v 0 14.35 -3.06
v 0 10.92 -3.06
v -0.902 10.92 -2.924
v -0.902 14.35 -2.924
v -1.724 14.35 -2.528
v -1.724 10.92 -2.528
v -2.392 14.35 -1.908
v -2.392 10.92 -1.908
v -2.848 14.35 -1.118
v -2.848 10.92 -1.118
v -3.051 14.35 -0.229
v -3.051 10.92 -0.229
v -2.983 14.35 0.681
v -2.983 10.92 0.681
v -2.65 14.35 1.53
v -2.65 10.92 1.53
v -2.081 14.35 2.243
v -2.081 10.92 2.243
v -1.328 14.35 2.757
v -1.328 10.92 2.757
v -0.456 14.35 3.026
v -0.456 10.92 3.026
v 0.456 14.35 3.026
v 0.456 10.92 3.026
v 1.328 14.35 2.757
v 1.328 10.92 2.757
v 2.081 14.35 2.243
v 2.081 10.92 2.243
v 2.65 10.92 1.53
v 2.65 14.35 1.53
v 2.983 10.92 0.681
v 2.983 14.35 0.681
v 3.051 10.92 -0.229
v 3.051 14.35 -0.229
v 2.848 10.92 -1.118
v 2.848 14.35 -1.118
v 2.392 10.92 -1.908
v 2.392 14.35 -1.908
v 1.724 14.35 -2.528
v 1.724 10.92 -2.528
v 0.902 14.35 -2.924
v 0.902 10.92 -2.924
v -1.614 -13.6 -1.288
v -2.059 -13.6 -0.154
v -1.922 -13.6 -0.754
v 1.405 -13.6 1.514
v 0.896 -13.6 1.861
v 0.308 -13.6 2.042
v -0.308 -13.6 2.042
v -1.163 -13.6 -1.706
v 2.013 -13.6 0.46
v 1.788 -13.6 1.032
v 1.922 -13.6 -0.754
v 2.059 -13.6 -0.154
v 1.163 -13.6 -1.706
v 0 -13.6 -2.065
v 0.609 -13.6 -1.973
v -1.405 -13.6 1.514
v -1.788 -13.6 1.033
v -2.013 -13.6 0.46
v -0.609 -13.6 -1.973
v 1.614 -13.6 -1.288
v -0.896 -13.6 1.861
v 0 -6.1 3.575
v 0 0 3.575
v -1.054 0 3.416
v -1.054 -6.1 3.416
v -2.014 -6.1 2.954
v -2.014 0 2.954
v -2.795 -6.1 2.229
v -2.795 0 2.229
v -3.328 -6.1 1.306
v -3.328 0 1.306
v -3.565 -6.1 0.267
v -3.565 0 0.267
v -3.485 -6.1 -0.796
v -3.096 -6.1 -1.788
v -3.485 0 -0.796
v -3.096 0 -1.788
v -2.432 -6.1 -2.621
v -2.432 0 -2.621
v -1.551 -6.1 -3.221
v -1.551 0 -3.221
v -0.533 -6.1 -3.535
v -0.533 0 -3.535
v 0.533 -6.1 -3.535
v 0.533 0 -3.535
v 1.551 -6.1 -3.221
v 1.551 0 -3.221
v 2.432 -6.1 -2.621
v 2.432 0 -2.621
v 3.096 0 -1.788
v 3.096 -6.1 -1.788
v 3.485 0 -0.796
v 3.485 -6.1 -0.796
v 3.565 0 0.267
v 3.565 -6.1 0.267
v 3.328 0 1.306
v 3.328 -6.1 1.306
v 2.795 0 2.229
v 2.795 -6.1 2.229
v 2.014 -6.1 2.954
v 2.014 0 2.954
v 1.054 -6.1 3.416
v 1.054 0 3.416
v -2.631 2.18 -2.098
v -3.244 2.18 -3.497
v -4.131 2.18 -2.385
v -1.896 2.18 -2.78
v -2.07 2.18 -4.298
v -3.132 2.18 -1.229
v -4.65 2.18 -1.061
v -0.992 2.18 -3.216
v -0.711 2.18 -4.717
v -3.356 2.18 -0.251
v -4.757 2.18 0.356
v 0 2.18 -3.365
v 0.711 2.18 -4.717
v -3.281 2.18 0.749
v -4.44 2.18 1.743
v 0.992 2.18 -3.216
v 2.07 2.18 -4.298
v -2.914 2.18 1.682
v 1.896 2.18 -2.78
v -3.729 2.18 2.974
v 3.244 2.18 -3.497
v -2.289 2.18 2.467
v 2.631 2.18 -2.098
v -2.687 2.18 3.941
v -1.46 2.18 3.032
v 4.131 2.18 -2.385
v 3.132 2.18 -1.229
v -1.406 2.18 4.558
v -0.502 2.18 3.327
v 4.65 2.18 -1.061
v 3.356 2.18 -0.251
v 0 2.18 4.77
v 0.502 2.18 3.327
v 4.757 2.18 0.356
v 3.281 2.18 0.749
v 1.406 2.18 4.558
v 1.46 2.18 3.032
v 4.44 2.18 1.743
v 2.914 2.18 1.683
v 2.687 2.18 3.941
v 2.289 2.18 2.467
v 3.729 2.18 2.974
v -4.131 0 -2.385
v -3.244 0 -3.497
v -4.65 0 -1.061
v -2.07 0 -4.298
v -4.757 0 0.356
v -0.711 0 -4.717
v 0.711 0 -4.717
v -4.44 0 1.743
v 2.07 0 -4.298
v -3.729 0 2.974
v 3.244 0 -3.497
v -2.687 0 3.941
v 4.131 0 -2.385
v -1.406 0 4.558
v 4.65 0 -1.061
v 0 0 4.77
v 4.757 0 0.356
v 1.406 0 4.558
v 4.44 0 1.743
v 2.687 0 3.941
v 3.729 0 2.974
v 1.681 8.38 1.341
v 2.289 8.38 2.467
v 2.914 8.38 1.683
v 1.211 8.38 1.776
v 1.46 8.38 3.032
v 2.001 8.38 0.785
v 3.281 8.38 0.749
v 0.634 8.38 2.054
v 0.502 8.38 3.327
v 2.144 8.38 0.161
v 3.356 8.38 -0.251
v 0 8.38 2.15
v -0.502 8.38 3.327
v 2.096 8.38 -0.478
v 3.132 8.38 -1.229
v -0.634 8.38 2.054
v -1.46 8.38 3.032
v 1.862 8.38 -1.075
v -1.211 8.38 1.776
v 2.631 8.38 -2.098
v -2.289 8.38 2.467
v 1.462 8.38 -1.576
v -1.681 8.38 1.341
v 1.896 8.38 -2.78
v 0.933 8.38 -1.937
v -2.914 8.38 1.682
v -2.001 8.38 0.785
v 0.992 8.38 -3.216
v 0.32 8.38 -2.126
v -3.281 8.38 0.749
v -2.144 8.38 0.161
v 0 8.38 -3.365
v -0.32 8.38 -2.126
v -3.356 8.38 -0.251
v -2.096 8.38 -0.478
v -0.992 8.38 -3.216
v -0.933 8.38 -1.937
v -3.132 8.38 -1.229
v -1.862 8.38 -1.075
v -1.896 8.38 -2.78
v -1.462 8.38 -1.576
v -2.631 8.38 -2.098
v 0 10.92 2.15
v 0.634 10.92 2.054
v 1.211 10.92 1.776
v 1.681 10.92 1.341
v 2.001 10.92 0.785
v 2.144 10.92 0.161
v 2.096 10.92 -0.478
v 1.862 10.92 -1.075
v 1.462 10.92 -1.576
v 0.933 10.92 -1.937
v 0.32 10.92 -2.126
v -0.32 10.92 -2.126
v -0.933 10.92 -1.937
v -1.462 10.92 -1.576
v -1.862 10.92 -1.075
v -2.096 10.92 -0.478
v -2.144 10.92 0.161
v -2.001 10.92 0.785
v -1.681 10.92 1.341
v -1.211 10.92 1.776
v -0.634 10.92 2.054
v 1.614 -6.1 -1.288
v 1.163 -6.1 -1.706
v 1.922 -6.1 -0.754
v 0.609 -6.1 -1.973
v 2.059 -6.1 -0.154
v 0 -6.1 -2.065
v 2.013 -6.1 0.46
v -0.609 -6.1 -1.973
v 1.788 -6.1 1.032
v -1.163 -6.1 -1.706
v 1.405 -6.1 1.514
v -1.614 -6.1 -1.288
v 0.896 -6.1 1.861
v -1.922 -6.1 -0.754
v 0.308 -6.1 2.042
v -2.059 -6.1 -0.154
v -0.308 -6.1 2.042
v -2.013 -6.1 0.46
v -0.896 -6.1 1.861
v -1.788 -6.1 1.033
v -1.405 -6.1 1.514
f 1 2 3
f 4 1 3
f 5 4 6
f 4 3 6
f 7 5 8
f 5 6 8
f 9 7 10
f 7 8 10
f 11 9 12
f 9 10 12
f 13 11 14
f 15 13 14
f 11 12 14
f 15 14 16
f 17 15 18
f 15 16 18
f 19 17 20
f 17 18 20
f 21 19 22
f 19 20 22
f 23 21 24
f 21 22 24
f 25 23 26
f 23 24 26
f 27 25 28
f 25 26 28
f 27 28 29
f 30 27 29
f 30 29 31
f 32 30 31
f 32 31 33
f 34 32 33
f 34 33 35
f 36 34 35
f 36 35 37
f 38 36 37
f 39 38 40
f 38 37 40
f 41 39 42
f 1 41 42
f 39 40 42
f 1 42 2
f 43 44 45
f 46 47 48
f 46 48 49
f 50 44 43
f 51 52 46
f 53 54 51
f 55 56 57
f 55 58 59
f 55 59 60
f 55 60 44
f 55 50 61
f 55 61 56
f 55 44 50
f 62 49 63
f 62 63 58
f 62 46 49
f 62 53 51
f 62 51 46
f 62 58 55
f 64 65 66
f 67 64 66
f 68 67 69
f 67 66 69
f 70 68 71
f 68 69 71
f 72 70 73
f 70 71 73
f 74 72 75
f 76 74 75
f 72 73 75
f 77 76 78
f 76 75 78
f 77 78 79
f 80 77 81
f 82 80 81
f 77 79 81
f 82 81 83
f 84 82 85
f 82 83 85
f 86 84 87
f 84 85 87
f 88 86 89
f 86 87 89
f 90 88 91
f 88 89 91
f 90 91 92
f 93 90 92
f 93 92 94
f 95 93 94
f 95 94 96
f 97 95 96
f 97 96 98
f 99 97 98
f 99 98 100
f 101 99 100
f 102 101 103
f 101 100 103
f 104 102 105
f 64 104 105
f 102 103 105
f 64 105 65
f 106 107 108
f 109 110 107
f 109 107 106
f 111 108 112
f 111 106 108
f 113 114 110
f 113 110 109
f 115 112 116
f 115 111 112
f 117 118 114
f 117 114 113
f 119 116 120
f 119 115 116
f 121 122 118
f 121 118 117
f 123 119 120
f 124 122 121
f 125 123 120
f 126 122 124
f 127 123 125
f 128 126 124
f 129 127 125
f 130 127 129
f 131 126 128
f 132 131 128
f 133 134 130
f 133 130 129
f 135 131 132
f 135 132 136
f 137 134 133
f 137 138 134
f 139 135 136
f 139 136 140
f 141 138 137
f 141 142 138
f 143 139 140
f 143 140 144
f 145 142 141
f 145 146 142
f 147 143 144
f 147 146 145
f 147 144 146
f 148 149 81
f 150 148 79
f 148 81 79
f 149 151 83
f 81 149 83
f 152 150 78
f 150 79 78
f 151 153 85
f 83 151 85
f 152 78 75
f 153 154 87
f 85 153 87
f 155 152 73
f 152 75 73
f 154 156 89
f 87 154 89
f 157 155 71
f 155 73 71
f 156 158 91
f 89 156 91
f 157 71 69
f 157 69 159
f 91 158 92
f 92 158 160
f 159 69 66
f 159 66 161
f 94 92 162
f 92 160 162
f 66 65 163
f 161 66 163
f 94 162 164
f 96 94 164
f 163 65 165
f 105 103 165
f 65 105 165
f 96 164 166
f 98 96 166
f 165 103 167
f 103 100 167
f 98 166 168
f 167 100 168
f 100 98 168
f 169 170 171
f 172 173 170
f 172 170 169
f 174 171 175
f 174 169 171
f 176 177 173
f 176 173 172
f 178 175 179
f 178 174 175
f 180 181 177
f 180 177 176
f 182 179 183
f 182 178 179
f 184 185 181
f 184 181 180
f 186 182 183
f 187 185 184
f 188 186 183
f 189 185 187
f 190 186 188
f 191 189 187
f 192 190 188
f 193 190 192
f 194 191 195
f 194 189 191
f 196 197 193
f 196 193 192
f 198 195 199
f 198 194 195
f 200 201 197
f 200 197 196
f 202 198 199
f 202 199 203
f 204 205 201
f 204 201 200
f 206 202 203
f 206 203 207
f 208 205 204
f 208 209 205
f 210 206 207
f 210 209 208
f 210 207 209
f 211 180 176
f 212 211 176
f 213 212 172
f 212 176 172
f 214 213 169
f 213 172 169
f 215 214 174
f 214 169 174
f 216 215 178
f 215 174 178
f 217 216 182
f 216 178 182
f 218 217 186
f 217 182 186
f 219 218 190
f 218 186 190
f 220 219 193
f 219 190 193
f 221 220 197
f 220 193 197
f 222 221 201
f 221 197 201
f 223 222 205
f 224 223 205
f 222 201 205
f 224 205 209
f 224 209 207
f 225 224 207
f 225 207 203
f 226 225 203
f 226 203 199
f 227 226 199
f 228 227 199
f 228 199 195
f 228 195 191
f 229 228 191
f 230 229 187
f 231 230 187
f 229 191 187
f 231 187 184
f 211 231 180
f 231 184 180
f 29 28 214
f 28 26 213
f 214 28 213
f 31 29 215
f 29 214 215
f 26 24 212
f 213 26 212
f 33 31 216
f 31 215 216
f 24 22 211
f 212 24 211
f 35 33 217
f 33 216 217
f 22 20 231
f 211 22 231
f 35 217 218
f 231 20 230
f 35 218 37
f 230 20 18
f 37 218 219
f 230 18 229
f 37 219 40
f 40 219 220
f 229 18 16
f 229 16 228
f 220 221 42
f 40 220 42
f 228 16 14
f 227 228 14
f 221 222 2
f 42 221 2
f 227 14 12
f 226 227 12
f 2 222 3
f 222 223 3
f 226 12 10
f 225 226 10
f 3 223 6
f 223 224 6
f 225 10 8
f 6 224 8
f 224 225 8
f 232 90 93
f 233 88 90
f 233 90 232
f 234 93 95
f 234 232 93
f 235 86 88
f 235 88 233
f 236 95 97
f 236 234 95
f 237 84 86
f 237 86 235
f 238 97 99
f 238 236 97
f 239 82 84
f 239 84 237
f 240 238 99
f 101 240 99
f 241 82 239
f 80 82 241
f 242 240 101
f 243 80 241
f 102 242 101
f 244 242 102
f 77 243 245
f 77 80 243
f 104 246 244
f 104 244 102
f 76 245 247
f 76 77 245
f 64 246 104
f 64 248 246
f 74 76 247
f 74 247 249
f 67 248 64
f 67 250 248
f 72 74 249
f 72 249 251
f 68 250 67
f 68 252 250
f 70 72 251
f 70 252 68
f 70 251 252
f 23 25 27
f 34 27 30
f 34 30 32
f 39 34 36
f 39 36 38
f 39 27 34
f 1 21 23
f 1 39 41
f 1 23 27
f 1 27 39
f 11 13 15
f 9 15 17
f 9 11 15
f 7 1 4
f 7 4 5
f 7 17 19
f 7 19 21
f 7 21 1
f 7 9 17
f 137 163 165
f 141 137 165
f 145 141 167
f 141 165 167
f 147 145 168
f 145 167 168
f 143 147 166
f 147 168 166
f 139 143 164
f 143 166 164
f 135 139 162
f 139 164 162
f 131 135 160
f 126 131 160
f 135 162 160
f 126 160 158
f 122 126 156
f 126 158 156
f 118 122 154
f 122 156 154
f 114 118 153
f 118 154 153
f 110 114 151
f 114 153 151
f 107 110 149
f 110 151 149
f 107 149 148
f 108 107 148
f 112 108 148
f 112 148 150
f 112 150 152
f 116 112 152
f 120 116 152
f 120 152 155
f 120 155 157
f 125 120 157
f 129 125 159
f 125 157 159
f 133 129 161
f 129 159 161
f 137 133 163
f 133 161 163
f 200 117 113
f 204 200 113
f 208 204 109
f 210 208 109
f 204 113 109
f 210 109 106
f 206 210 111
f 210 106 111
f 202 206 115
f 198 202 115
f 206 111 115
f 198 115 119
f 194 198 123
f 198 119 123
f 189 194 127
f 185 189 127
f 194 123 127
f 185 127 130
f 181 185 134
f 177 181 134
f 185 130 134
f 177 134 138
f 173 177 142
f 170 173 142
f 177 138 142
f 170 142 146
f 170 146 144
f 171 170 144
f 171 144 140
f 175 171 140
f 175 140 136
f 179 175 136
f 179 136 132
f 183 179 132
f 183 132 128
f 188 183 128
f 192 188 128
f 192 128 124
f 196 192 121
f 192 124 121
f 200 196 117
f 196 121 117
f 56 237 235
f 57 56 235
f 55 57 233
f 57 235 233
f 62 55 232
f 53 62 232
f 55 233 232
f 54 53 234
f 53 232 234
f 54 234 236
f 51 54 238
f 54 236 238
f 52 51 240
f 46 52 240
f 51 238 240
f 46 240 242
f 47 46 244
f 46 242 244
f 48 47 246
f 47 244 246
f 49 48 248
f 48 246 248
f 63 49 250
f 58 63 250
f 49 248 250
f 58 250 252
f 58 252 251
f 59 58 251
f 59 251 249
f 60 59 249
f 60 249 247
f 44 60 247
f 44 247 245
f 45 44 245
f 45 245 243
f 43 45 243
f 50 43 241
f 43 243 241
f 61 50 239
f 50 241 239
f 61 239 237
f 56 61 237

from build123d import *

# Parameters (mm, degrees)
SKETCH1_R           = 4.77
BOSS_EXTRUDE1_DEPTH = 2.18
SKETCH2_R           = 3.575
BOSS_EXTRUDE2_DEPTH = 6.1
SKETCH3_R           = 2.065
BOSS_EXTRUDE3_DEPTH = 7.5
SKETCH4_R           = 3.365
BOSS_EXTRUDE4_DEPTH = 6.2
SKETCH5_R           = 2.15
BOSS_EXTRUDE5_DEPTH = 2.54
SKETCH6_R           = 3.06
BOSS_EXTRUDE6_DEPTH = 3.43


with BuildPart() as part:
    # Sketch1 → Boss-Extrude1 (new body)
    with BuildSketch(Plane(origin=(0, 0, 0), x_dir=(1, 0, 0), z_dir=(0, 1, 0))):
        with Locations(Location((0, 0, 0), (0, 0, 270))):
            Circle(SKETCH1_R)
    extrude(amount=BOSS_EXTRUDE1_DEPTH)

    # Sketch2 → Boss-Extrude2 (add)
    with BuildSketch(Plane.XZ):
        with Locations(Location((0, 0, 0), (0, 0, 90))):
            Circle(SKETCH2_R)
    extrude(amount=BOSS_EXTRUDE2_DEPTH)

    # Sketch3 → Boss-Extrude3 (add)
    with BuildSketch(Plane.XZ.offset(6.1)):
        with Locations(Location((0, 0, 0), (0, 0, 270))):
            Circle(SKETCH3_R)
    extrude(amount=BOSS_EXTRUDE3_DEPTH)

    # Sketch4 → Boss-Extrude4 (add)
    with BuildSketch(Plane(origin=(0, 2.18, 0), x_dir=(1, 0, 0), z_dir=(0, 1, 0))):
        with Locations(Location((0, 0, 0), (0, 0, 90))):
            Circle(SKETCH4_R)
    extrude(amount=BOSS_EXTRUDE4_DEPTH)

    # Sketch5 → Boss-Extrude5 (add)
    with BuildSketch(Plane(origin=(0, 8.38, 0), x_dir=(1, 0, 0), z_dir=(0, 1, 0))):
        with Locations(Location((0, 0, 0), (0, 0, 270))):
            Circle(SKETCH5_R)
    extrude(amount=BOSS_EXTRUDE5_DEPTH)

    # Sketch6 → Boss-Extrude6 (add)
    with BuildSketch(Plane(origin=(0, 10.92, 0), x_dir=(1, 0, 0), z_dir=(0, 1, 0))):
        with Locations(Location((0, 0, 0), (0, 0, 90))):
            Circle(SKETCH6_R)
    extrude(amount=BOSS_EXTRUDE6_DEPTH)


solid = part.part
